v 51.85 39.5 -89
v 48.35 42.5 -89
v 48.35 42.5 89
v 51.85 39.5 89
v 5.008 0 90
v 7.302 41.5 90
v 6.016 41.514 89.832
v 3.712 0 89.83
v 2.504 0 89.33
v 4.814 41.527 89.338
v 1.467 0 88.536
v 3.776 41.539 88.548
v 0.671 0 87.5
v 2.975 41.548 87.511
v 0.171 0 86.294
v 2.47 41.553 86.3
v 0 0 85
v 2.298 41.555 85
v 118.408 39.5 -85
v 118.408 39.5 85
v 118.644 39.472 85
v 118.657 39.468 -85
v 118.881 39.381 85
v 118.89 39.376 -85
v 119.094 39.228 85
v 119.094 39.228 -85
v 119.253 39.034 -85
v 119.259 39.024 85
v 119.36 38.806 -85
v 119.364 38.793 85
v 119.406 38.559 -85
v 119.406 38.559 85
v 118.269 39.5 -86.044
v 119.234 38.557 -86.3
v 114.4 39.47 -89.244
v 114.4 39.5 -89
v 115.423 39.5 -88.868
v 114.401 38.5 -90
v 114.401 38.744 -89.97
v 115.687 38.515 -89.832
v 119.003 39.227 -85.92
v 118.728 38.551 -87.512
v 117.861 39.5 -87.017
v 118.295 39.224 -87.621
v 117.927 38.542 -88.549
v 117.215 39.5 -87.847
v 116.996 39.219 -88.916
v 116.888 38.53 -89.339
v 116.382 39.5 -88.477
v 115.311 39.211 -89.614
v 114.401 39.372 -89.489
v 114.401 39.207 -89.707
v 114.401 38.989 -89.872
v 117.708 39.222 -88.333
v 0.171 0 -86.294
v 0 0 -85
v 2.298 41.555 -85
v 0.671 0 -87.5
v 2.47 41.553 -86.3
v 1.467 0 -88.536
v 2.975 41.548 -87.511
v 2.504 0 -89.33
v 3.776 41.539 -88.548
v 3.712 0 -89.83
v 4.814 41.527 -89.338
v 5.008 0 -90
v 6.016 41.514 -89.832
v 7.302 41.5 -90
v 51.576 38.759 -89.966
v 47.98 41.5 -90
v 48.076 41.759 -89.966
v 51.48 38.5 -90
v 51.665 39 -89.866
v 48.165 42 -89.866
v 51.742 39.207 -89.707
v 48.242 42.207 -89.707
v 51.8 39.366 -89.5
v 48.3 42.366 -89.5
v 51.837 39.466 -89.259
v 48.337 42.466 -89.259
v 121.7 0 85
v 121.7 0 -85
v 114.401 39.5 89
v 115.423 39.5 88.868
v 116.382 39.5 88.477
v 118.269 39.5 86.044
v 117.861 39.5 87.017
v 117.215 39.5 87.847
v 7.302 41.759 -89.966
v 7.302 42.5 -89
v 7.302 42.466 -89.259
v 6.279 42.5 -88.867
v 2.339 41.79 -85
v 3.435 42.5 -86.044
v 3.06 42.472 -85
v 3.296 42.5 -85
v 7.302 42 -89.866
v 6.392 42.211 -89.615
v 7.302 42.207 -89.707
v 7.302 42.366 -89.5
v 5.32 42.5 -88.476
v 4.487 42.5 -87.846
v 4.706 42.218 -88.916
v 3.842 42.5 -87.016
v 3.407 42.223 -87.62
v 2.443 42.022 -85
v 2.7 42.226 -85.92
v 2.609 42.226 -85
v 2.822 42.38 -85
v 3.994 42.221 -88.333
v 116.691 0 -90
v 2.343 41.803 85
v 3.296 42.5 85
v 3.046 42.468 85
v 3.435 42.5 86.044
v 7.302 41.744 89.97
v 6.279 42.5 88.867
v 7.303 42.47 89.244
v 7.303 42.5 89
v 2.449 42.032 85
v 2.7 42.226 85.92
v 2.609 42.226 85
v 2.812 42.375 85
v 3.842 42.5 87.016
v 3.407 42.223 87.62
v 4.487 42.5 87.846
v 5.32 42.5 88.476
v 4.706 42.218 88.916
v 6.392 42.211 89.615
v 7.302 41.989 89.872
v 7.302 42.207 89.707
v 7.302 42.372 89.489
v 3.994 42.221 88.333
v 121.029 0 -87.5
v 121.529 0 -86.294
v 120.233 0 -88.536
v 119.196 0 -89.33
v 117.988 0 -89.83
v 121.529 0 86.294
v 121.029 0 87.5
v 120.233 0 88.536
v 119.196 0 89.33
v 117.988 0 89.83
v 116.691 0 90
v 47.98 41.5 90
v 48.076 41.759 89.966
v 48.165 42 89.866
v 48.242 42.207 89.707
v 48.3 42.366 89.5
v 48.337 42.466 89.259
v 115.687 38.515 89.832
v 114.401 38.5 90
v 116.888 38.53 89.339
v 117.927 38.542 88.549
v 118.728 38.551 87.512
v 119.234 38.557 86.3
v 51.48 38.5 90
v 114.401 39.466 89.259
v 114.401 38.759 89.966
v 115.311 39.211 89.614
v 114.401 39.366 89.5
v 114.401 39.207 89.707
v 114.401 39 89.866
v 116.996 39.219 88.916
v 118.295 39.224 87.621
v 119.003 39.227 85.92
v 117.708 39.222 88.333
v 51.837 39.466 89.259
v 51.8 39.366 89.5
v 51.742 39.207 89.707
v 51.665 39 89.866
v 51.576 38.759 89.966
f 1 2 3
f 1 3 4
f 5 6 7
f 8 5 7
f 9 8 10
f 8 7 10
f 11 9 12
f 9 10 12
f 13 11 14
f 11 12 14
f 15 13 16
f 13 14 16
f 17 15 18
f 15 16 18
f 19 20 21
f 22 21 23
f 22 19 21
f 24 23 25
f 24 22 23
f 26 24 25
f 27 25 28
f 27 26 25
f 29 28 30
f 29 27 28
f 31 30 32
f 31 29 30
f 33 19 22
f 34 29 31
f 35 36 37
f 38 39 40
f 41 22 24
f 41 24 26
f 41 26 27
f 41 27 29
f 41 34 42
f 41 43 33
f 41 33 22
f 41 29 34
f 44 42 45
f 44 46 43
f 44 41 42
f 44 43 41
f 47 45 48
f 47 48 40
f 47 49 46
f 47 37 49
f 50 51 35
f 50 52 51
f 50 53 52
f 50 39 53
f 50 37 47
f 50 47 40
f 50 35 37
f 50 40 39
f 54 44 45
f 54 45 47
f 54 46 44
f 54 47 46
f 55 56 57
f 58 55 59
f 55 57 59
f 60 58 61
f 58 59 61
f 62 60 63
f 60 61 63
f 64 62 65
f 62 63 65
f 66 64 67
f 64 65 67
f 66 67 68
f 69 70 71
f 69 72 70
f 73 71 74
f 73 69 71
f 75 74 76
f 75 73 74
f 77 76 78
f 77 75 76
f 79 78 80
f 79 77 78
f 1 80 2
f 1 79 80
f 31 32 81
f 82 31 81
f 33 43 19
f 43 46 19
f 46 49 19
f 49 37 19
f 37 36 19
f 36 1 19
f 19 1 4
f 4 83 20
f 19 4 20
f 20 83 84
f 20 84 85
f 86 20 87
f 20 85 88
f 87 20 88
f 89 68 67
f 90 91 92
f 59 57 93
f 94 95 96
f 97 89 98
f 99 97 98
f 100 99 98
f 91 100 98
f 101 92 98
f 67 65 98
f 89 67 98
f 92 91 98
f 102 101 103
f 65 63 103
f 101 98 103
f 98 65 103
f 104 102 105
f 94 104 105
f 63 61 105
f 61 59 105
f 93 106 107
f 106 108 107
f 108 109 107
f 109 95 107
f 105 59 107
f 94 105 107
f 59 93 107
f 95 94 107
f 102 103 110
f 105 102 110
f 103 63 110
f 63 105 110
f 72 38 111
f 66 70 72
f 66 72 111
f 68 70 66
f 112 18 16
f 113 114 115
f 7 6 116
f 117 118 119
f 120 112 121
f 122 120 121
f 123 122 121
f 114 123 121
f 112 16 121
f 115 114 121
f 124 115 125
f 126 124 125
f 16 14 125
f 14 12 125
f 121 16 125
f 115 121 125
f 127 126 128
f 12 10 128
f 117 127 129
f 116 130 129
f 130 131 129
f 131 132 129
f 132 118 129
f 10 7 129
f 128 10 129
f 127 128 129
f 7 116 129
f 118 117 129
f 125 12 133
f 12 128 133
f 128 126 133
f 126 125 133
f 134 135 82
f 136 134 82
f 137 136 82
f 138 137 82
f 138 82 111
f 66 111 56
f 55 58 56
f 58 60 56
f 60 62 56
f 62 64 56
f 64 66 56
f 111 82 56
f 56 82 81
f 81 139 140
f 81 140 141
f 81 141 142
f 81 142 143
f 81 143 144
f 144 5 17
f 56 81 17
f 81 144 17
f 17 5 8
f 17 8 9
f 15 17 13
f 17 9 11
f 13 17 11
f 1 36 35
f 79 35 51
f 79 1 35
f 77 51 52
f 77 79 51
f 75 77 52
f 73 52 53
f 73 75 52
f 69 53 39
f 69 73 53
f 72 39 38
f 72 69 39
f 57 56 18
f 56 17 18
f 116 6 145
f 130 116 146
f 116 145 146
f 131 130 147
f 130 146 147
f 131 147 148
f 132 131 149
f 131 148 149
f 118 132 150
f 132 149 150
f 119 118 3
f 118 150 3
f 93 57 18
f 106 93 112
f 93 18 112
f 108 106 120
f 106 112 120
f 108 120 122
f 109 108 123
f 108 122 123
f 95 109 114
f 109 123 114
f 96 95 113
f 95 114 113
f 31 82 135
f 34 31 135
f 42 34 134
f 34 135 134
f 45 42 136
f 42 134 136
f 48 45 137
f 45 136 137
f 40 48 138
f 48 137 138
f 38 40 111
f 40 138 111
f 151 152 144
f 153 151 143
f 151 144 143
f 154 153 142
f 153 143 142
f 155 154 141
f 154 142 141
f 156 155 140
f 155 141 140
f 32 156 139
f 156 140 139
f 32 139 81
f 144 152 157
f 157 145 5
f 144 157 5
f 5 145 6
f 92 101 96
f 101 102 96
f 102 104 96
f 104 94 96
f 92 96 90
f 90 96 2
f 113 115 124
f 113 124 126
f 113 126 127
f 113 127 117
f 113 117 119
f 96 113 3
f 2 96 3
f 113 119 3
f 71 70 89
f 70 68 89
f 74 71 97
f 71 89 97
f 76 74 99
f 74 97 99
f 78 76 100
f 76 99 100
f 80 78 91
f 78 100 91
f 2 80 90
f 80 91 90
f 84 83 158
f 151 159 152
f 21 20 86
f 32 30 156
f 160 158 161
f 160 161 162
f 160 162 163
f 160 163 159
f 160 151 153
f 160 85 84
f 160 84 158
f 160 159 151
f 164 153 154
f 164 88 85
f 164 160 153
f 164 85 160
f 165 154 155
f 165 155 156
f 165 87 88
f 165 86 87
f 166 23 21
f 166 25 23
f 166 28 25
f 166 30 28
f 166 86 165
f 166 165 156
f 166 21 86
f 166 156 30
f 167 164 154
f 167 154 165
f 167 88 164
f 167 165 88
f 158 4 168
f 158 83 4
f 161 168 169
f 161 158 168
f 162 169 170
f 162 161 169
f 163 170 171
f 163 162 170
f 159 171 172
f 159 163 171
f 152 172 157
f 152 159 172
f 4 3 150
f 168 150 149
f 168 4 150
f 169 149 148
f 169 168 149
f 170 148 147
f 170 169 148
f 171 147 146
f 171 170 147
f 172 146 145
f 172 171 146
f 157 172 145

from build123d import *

# Parameters (mm, degrees)
PAD_DEPTH   = 90
FILLET_R    = 5
FILLET001_R = 1


with BuildPart() as part:
    # Sketch → Pad (new body, symmetric)
    with BuildSketch(Plane.XY):
        Polygon((51.85, 39.5), (119.35, 39.5), (121.7, 0), (0, 0), (2.35, 42.5), (48.35, 42.5), align=None)
    extrude(amount=PAD_DEPTH, both=True)

    # Fillet
    fillet_edges = [part.edges().sort_by_distance(p)[0] for p in [
        (120.525, 19.75, 90),
        (1.175, 21.25, 90),
        (120.525, 19.75, -90),
        (1.175, 21.25, -90),
    ]]
    fillet(fillet_edges, radius=FILLET_R)

    # Fillet001
    fillet001_edges = [part.edges().sort_by_distance(p)[0] for p in [
        (83.09558, 39.5, 90),
        (50.1, 41, 90),
        (27.853819, 42.5, 90),
        (3.818055, 42.5, 88.536883),
        (2.35, 42.5, 0),
        (3.818055, 42.5, -88.536883),
        (27.853819, 42.5, -90),
        (50.1, 41, -90),
        (83.09558, 39.5, -90),
        (117.88138, 39.5, -88.537095),
        (119.35, 39.5, 0),
        (117.88138, 39.5, 88.537095),
    ]]
    fillet(fillet001_edges, radius=FILLET001_R)


solid = part.part
